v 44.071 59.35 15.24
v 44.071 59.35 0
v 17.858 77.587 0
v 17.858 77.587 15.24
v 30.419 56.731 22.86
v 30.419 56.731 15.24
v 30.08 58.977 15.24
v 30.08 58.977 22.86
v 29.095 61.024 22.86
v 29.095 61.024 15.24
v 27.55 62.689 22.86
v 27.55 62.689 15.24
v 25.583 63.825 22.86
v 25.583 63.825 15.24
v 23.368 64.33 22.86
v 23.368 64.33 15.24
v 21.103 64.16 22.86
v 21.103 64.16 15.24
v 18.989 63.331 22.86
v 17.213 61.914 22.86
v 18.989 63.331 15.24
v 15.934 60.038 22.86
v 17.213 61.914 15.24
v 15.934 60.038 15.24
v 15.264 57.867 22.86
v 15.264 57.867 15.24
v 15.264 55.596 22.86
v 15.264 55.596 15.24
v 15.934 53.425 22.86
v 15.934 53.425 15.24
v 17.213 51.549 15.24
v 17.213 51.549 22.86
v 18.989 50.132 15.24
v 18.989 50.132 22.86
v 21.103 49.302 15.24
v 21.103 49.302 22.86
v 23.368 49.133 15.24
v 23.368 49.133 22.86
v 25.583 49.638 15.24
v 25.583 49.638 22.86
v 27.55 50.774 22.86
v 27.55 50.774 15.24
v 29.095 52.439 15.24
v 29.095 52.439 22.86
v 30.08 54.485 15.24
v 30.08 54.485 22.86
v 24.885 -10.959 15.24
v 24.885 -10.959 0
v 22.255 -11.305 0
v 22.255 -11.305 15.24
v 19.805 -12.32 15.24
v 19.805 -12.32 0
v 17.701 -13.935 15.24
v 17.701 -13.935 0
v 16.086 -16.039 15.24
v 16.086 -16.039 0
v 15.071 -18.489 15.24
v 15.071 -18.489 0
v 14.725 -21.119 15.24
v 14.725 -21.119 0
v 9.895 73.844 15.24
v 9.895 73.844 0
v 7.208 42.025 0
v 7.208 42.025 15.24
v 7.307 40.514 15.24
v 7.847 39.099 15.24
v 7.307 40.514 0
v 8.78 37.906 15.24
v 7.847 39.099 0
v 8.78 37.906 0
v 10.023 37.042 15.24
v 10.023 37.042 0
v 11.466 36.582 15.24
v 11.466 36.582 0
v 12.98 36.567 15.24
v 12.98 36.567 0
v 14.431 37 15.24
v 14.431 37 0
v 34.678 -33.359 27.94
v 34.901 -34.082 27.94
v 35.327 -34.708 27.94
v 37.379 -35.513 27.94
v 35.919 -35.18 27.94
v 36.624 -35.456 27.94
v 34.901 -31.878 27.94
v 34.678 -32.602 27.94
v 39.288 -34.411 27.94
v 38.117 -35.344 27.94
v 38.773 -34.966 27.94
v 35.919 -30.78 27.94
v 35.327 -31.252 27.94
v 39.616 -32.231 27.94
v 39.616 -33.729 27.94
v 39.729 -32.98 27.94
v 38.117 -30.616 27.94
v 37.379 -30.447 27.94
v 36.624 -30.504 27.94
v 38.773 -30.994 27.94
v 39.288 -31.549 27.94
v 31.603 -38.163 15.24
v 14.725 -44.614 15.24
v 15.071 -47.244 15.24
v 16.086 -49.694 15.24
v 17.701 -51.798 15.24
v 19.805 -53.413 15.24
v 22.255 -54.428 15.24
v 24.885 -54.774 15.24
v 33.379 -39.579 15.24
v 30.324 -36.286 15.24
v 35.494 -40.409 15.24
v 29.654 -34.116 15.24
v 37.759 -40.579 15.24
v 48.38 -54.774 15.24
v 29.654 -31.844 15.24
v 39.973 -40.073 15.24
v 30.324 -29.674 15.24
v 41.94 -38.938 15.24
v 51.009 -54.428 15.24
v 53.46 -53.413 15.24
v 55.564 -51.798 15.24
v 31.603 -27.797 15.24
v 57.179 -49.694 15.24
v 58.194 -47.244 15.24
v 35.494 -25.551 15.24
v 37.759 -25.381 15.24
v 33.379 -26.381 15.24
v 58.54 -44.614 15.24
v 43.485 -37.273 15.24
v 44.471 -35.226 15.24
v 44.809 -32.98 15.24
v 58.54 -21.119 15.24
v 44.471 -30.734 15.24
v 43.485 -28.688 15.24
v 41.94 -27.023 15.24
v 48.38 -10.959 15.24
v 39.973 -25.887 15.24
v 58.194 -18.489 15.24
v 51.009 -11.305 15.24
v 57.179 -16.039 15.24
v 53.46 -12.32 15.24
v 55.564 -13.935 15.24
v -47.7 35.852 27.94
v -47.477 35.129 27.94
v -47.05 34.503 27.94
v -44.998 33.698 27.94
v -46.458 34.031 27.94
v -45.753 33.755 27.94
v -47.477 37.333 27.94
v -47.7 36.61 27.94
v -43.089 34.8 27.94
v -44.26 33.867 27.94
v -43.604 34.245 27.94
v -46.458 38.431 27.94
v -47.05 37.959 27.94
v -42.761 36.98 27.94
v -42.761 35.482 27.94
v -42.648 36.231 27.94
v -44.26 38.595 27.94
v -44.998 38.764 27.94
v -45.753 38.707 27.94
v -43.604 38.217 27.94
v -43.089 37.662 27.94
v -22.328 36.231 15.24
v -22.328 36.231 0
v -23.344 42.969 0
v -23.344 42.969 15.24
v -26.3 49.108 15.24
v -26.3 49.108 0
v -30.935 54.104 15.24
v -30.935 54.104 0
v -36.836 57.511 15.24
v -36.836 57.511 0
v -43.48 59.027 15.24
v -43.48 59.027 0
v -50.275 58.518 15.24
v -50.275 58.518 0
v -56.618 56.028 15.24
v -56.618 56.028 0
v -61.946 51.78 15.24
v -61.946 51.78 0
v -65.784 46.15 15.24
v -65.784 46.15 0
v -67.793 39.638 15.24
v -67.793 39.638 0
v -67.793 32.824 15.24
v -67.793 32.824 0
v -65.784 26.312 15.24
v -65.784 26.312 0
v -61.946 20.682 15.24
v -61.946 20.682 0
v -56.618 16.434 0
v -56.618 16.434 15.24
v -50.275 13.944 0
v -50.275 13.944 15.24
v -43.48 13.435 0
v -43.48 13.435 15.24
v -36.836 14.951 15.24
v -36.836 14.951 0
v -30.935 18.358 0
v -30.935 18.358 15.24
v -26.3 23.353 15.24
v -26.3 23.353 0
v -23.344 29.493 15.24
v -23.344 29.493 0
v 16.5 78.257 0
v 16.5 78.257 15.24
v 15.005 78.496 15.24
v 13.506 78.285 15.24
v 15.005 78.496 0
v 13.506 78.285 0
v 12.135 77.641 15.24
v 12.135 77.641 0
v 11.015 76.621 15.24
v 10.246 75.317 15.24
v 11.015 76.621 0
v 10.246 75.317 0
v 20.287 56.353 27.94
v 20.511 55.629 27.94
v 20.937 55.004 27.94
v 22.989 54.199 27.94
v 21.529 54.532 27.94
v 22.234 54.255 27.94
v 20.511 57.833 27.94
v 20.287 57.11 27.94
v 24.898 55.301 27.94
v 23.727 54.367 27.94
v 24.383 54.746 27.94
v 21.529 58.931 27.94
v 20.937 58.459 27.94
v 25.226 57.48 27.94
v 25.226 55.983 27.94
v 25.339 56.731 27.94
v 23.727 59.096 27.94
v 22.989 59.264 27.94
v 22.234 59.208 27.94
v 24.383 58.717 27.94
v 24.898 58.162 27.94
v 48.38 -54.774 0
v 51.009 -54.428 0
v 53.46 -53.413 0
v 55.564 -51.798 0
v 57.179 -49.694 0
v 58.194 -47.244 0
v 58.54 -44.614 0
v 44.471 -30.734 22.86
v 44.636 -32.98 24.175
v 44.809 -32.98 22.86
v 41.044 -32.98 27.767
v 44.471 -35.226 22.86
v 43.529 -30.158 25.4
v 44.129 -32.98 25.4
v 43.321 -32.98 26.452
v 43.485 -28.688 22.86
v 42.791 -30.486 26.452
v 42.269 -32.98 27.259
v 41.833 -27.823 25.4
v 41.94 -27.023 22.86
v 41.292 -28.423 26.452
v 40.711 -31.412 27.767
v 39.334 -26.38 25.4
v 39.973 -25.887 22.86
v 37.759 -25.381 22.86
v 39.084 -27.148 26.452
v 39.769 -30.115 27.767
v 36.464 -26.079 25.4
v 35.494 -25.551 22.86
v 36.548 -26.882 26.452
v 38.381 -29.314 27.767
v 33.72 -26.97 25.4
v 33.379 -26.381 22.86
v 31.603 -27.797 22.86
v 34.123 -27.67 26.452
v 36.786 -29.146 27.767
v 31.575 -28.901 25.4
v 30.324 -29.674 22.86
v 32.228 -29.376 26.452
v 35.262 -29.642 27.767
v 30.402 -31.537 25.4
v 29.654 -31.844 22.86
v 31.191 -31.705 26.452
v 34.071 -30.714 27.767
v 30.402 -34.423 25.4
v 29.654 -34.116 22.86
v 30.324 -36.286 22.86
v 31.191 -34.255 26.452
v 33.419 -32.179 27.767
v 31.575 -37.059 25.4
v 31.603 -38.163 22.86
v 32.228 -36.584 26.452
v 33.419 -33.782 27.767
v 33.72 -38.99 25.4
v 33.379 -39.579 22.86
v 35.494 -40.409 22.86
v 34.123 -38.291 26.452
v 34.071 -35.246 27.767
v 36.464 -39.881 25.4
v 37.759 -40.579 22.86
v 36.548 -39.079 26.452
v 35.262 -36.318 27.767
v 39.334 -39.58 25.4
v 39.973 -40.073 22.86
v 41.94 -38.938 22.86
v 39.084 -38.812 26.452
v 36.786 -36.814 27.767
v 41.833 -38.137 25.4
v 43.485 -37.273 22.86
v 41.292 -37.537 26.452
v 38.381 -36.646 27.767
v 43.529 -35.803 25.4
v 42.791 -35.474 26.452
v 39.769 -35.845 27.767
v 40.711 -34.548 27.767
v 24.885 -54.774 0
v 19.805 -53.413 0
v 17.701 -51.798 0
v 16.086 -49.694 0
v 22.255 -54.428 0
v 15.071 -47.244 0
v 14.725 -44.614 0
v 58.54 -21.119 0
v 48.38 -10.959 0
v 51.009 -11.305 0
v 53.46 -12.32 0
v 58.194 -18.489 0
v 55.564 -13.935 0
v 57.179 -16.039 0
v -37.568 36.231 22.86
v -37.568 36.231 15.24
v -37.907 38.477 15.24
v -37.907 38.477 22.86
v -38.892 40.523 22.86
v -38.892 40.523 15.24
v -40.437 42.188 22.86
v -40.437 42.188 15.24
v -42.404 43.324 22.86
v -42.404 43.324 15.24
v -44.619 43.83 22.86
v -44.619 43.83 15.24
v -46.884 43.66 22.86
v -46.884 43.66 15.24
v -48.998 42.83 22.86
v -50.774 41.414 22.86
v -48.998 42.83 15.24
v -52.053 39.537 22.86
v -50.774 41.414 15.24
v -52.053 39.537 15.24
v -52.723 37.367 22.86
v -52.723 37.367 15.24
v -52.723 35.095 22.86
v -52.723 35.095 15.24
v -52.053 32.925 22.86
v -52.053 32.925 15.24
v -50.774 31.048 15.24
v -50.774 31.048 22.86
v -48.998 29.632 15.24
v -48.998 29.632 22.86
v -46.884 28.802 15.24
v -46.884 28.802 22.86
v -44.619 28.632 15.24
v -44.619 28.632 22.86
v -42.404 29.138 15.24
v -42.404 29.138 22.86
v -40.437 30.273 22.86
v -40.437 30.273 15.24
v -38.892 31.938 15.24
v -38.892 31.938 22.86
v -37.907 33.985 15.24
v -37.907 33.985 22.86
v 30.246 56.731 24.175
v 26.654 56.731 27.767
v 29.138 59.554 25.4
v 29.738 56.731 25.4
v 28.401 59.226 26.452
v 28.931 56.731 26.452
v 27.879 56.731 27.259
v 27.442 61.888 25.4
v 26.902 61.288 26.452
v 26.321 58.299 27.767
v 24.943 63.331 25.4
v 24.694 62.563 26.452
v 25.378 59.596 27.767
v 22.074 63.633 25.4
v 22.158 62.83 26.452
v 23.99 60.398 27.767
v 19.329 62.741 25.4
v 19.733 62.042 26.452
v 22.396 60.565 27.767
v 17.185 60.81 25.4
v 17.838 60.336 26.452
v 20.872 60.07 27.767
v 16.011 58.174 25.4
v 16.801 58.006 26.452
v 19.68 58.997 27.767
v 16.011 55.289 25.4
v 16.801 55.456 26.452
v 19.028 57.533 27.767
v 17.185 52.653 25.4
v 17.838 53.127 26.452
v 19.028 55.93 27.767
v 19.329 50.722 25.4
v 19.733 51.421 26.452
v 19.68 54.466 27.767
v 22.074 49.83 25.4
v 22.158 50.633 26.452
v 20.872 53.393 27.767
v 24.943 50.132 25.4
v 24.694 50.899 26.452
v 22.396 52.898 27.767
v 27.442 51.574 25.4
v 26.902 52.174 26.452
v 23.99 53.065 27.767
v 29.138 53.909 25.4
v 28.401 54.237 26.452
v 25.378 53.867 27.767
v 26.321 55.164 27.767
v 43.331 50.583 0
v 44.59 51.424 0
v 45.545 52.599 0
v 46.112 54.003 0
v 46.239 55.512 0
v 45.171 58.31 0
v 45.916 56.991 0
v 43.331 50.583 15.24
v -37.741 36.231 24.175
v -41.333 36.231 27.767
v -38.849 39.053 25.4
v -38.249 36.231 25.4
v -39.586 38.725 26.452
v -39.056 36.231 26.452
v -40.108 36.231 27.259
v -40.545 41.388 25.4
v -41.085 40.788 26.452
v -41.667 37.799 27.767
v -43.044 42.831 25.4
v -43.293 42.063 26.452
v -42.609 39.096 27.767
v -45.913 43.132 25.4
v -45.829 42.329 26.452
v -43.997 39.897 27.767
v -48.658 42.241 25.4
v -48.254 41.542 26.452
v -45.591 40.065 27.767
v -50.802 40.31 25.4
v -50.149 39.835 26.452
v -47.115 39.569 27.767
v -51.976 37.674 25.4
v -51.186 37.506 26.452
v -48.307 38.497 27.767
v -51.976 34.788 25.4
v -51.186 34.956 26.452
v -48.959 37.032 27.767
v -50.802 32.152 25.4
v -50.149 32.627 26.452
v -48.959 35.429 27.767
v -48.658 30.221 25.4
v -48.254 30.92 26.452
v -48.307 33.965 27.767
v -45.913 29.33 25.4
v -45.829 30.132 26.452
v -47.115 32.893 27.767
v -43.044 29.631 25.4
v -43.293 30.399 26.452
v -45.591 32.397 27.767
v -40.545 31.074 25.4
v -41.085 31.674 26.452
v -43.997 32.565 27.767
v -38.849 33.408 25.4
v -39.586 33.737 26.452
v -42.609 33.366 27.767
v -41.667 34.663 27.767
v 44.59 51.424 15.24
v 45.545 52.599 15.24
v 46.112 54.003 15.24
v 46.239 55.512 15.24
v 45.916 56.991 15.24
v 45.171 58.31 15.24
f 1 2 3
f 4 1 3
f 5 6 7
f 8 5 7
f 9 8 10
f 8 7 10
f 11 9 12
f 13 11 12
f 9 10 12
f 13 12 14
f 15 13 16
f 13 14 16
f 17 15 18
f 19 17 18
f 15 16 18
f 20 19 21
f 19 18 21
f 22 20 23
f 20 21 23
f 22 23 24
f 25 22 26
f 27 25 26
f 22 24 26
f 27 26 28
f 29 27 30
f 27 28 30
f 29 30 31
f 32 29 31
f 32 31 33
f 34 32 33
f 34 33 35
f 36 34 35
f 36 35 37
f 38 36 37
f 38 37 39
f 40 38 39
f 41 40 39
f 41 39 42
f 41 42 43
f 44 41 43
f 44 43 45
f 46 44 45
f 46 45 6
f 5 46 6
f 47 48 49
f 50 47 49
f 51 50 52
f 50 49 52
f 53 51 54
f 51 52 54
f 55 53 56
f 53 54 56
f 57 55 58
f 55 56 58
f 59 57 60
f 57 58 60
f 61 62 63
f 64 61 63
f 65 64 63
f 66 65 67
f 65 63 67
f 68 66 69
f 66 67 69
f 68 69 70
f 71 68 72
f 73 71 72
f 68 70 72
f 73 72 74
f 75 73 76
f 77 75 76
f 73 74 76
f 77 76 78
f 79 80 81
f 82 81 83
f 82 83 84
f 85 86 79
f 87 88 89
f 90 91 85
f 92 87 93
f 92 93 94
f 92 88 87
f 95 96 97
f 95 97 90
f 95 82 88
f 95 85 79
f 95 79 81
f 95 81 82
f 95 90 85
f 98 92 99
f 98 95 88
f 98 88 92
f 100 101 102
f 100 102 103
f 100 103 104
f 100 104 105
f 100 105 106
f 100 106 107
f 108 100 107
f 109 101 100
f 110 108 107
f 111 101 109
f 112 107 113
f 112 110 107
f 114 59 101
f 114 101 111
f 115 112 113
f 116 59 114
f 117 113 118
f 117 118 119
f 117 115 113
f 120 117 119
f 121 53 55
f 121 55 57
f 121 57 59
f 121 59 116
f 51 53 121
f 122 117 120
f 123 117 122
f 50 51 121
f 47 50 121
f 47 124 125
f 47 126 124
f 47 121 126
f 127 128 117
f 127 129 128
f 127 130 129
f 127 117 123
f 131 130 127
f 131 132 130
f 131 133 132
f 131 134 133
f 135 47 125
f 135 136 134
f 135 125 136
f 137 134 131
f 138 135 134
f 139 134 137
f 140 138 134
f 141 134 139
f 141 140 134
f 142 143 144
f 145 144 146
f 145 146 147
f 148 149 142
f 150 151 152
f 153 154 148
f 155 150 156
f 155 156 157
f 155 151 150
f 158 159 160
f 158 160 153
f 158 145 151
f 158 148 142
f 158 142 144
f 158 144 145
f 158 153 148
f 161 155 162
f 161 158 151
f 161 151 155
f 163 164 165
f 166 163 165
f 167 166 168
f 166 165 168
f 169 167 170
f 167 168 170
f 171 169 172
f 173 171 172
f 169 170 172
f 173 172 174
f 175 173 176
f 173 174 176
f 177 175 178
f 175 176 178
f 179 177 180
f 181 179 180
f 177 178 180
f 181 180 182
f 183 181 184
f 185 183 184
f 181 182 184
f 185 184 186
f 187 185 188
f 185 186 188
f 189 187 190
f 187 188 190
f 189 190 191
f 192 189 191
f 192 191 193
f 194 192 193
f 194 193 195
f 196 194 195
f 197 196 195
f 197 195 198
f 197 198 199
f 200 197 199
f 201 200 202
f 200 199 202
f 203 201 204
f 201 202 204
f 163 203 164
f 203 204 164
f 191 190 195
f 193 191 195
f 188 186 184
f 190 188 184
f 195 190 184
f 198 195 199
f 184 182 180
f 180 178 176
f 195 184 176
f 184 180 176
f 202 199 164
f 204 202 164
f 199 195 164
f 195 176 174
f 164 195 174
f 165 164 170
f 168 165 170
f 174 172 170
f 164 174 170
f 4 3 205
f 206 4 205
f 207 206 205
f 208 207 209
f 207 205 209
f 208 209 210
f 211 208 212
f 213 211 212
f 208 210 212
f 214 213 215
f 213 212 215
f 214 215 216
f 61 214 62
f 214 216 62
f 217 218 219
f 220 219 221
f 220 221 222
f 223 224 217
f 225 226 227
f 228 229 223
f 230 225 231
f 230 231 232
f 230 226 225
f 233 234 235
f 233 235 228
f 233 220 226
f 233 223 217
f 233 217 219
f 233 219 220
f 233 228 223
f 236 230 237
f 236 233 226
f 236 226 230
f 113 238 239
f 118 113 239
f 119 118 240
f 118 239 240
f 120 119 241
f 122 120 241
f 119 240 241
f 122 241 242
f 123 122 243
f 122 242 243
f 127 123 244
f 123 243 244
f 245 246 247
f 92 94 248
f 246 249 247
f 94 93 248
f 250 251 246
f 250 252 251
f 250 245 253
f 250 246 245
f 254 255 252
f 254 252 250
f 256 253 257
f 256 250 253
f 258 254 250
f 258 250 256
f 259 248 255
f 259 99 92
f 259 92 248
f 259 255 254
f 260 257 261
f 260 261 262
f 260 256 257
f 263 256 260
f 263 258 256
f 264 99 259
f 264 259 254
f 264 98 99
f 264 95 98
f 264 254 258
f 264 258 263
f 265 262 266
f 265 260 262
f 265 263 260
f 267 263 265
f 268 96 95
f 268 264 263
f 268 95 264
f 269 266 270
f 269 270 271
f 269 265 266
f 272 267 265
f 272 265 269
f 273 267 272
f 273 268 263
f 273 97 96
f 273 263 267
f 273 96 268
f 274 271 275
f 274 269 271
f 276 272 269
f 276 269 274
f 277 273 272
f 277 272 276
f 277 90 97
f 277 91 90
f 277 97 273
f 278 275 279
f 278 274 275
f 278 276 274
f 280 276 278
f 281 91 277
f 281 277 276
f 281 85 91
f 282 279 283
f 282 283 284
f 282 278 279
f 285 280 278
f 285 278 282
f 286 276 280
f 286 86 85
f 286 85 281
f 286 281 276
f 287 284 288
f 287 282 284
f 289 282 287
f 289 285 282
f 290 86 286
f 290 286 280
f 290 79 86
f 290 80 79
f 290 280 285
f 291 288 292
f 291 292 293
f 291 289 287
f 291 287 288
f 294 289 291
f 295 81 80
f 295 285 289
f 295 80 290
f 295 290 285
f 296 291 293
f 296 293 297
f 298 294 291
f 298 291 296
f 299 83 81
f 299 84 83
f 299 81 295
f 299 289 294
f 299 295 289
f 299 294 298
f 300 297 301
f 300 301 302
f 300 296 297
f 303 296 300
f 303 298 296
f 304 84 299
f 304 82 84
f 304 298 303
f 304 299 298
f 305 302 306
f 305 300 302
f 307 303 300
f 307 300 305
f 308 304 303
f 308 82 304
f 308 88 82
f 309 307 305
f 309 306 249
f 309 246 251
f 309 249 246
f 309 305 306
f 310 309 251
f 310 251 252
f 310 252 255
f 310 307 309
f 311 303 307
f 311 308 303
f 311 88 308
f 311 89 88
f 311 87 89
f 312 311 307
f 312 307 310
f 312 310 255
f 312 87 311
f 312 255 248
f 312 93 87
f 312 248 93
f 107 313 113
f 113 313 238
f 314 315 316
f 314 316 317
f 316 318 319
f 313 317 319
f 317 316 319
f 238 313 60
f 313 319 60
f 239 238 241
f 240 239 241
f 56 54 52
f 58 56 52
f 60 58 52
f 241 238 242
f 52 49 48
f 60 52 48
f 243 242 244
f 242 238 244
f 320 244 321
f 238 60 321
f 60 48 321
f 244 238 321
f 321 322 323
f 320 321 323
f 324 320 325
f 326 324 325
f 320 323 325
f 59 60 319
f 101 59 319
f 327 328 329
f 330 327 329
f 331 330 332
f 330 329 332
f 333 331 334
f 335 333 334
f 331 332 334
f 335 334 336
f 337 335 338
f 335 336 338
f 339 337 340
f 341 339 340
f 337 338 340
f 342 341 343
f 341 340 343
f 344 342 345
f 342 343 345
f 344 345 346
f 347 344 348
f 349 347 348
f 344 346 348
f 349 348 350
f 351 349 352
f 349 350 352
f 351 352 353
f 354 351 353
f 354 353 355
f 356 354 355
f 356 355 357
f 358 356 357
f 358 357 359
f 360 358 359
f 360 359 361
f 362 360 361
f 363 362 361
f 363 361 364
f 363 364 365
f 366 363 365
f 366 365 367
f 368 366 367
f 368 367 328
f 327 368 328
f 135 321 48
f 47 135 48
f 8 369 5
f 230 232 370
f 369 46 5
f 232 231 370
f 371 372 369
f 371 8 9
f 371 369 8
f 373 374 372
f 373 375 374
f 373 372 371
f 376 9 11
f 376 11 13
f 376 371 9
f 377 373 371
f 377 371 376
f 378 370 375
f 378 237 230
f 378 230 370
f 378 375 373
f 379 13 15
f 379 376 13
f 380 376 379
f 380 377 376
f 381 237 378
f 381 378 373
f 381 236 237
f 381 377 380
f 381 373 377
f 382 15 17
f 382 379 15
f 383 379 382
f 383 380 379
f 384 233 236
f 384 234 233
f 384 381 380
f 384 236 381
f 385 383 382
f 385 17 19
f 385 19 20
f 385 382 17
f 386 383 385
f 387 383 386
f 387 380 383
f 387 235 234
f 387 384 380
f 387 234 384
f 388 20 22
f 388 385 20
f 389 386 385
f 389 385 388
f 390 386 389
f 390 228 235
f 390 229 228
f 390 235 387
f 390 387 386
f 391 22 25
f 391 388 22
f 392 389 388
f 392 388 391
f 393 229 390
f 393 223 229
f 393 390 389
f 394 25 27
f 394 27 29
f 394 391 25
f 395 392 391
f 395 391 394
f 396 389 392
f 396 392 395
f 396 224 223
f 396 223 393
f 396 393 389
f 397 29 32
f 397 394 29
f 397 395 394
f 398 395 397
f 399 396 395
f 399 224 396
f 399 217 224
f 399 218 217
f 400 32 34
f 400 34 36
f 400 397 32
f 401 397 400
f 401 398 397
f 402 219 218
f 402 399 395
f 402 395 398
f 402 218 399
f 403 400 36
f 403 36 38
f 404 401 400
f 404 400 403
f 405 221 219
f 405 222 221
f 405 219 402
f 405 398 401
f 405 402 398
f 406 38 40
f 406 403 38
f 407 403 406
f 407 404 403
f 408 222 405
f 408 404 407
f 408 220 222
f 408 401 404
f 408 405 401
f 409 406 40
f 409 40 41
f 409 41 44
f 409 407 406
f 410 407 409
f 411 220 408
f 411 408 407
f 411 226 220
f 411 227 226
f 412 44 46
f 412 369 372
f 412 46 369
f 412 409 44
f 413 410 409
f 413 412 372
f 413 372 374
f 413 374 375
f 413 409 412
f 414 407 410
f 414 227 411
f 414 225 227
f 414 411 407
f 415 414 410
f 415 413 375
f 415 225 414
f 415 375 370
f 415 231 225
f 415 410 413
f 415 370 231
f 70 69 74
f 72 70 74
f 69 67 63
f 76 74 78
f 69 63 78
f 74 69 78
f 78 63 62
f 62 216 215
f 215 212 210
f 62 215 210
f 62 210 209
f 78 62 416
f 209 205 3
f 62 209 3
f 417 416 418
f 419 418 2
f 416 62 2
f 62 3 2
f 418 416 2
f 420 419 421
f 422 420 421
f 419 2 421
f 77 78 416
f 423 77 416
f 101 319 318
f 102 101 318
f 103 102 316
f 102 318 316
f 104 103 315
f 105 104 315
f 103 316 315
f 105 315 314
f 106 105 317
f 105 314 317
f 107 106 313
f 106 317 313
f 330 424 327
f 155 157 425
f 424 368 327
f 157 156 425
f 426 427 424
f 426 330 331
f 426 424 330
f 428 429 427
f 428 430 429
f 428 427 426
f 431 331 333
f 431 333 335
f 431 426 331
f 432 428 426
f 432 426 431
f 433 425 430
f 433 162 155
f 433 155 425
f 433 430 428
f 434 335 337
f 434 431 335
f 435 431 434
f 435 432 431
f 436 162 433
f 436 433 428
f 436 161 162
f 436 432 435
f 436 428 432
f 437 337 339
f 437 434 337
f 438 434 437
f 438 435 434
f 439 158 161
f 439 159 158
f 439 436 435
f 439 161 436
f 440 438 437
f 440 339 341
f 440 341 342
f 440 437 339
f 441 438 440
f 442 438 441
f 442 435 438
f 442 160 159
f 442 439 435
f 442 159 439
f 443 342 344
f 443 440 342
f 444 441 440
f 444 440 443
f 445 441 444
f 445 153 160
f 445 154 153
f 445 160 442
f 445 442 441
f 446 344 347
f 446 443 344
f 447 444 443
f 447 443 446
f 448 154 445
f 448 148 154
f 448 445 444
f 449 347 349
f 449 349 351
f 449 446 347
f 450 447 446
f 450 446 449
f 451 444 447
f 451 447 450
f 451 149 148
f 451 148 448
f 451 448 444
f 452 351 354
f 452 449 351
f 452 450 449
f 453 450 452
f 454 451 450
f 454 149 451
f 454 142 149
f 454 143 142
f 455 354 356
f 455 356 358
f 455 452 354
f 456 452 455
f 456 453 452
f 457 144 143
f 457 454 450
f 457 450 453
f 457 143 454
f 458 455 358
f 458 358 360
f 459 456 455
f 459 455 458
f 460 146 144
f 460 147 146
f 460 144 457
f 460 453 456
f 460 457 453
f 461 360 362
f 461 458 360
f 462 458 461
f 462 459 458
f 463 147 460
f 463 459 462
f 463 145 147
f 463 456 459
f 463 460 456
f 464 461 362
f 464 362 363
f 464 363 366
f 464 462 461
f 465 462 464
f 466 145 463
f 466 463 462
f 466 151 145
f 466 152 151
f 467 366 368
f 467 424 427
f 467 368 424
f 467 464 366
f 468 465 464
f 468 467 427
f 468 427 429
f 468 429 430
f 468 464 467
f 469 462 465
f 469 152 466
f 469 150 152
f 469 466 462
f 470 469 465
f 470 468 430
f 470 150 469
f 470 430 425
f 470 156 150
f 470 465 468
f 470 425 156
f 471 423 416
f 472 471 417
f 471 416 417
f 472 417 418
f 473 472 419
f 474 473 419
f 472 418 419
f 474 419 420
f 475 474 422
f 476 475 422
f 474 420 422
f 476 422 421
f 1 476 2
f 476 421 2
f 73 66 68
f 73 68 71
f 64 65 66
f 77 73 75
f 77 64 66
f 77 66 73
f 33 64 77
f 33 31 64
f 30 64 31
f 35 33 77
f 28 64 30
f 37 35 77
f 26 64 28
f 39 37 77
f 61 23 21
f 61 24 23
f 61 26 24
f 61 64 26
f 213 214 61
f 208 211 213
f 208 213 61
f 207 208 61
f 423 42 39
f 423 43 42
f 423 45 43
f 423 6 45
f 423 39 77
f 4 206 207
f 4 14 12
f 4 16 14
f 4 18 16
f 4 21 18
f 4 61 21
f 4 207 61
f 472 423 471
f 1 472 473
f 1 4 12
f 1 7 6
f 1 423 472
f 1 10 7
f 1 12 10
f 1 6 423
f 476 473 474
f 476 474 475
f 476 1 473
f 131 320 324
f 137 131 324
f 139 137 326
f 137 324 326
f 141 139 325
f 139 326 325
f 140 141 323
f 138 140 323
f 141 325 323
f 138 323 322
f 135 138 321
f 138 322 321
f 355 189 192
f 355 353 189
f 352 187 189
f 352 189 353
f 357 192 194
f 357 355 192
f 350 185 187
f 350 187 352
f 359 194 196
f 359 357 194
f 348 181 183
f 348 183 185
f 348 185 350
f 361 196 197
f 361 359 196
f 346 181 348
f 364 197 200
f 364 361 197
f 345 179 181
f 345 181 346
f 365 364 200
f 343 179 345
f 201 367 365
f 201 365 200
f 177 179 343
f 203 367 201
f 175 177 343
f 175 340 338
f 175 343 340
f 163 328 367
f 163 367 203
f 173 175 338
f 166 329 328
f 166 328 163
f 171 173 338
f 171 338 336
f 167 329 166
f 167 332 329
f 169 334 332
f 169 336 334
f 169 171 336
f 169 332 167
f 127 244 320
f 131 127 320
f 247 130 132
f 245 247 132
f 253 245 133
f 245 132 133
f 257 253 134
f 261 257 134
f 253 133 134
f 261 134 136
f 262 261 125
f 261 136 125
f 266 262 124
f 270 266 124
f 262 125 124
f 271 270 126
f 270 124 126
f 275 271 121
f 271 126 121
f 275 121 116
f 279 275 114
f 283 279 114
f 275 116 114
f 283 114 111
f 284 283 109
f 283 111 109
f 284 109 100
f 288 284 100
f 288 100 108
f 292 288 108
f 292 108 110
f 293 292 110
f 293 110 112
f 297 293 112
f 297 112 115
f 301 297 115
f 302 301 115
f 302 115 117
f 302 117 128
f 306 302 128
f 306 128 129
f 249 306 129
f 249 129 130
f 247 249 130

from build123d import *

# Parameters (mm, degrees)
F0_R      = 22.86
F0_R_2    = 7.62
F1_DEPTH  = 15.24
F2_R      = 7.62
F3_DEPTH  = 15.24
F4_R      = 7.62
F5_DEPTH  = 15.24
F6_DEPTH  = 27.94
F7_R      = 5.08
F8_DEPTH  = 27.94
F9_R      = 5.08
F10_DEPTH = 27.94
F11_R     = 5.08


with BuildPart() as f1:
    # F0 (on Top) → F1 (new body)
    with BuildSketch(Plane.XY):
        with Locations((-45.18804, 36.230944)):
            Circle(F0_R)
        with Locations((-45.18804, 36.230944)):
            Circle(F0_R_2, mode=Mode.SUBTRACT)
    extrude(amount=F1_DEPTH)

    # F0 (on Top) → F8 (join)
    with BuildSketch(Plane.XY):
        with Locations((-45.18804, 36.230944)):
            Circle(F0_R_2)
    extrude(amount=F8_DEPTH)

    # F9
    f9_edges = [f1.edges().sort_by_distance(p)[0] for p in [
        (-52.80804, 36.230944, 27.94),
    ]]
    fillet(f9_edges, radius=F9_R)


with BuildPart() as f3:
    # F2 (on Top) → F3 (new body)
    with BuildSketch(Plane.XY):
        with BuildLine():
            Line((48.379748, -10.958963), (24.884748, -10.958963))
            ThreePointArc((24.884748, -10.958963), (17.700543, -13.934758), (14.724748, -21.118963))
            Line((14.724748, -21.118963), (14.724748, -44.613963))
            ThreePointArc((14.724748, -44.613963), (17.700543, -51.798168), (24.884748, -54.773963))
            Line((24.884748, -54.773963), (48.379748, -54.773963))
            ThreePointArc((48.379748, -54.773963), (55.563953, -51.798168), (58.539748, -44.613963))
            Line((58.539748, -44.613963), (58.539748, -21.118963))
            ThreePointArc((58.539748, -21.118963), (55.563953, -13.934758), (48.379748, -10.958963))
        make_face()
        with Locations((37.189316, -32.980077)):
            Circle(F2_R, mode=Mode.SUBTRACT)
    extrude(amount=F3_DEPTH)

    # F2 (on Top) → F6 (join)
    with BuildSketch(Plane.XY):
        with Locations((37.189316, -32.980077)):
            Circle(F2_R)
    extrude(amount=F6_DEPTH)

    # F7
    f7_edges = [f3.edges().sort_by_distance(p)[0] for p in [
        (29.569316, -32.980077, 27.94),
    ]]
    fillet(f7_edges, radius=F7_R)


with BuildPart() as f5:
    # F4 (on Top) → F5 (new body)
    with BuildSketch(Plane.XY):
        with BuildLine():
            Line((14.431024, 36.999955), (43.330593, 50.582694))
            ThreePointArc((43.330593, 50.582694), (46.231752, 54.752787), (44.070925, 59.350311))
            Line((44.070925, 59.350311), (17.858143, 77.586702))
            ThreePointArc((17.858143, 77.586702), (12.796157, 78.014132), (9.894998, 73.844039))
            Line((9.894998, 73.844039), (7.208211, 42.024909))
            ThreePointArc((7.208211, 42.024909), (9.369038, 37.427385), (14.431024, 36.999955))
        make_face()
        with Locations((22.798982, 56.731435)):
            Circle(F4_R, mode=Mode.SUBTRACT)
    extrude(amount=F5_DEPTH)

    # F4 (on Top) → F10 (join)
    with BuildSketch(Plane.XY):
        with Locations((22.798982, 56.731435)):
            Circle(F4_R)
    extrude(amount=F10_DEPTH)

    # F11
    f11_edges = [f5.edges().sort_by_distance(p)[0] for p in [
        (15.178982, 56.731435, 27.94),
    ]]
    fillet(f11_edges, radius=F11_R)


solid = Compound([f1.part, f3.part, f5.part])
